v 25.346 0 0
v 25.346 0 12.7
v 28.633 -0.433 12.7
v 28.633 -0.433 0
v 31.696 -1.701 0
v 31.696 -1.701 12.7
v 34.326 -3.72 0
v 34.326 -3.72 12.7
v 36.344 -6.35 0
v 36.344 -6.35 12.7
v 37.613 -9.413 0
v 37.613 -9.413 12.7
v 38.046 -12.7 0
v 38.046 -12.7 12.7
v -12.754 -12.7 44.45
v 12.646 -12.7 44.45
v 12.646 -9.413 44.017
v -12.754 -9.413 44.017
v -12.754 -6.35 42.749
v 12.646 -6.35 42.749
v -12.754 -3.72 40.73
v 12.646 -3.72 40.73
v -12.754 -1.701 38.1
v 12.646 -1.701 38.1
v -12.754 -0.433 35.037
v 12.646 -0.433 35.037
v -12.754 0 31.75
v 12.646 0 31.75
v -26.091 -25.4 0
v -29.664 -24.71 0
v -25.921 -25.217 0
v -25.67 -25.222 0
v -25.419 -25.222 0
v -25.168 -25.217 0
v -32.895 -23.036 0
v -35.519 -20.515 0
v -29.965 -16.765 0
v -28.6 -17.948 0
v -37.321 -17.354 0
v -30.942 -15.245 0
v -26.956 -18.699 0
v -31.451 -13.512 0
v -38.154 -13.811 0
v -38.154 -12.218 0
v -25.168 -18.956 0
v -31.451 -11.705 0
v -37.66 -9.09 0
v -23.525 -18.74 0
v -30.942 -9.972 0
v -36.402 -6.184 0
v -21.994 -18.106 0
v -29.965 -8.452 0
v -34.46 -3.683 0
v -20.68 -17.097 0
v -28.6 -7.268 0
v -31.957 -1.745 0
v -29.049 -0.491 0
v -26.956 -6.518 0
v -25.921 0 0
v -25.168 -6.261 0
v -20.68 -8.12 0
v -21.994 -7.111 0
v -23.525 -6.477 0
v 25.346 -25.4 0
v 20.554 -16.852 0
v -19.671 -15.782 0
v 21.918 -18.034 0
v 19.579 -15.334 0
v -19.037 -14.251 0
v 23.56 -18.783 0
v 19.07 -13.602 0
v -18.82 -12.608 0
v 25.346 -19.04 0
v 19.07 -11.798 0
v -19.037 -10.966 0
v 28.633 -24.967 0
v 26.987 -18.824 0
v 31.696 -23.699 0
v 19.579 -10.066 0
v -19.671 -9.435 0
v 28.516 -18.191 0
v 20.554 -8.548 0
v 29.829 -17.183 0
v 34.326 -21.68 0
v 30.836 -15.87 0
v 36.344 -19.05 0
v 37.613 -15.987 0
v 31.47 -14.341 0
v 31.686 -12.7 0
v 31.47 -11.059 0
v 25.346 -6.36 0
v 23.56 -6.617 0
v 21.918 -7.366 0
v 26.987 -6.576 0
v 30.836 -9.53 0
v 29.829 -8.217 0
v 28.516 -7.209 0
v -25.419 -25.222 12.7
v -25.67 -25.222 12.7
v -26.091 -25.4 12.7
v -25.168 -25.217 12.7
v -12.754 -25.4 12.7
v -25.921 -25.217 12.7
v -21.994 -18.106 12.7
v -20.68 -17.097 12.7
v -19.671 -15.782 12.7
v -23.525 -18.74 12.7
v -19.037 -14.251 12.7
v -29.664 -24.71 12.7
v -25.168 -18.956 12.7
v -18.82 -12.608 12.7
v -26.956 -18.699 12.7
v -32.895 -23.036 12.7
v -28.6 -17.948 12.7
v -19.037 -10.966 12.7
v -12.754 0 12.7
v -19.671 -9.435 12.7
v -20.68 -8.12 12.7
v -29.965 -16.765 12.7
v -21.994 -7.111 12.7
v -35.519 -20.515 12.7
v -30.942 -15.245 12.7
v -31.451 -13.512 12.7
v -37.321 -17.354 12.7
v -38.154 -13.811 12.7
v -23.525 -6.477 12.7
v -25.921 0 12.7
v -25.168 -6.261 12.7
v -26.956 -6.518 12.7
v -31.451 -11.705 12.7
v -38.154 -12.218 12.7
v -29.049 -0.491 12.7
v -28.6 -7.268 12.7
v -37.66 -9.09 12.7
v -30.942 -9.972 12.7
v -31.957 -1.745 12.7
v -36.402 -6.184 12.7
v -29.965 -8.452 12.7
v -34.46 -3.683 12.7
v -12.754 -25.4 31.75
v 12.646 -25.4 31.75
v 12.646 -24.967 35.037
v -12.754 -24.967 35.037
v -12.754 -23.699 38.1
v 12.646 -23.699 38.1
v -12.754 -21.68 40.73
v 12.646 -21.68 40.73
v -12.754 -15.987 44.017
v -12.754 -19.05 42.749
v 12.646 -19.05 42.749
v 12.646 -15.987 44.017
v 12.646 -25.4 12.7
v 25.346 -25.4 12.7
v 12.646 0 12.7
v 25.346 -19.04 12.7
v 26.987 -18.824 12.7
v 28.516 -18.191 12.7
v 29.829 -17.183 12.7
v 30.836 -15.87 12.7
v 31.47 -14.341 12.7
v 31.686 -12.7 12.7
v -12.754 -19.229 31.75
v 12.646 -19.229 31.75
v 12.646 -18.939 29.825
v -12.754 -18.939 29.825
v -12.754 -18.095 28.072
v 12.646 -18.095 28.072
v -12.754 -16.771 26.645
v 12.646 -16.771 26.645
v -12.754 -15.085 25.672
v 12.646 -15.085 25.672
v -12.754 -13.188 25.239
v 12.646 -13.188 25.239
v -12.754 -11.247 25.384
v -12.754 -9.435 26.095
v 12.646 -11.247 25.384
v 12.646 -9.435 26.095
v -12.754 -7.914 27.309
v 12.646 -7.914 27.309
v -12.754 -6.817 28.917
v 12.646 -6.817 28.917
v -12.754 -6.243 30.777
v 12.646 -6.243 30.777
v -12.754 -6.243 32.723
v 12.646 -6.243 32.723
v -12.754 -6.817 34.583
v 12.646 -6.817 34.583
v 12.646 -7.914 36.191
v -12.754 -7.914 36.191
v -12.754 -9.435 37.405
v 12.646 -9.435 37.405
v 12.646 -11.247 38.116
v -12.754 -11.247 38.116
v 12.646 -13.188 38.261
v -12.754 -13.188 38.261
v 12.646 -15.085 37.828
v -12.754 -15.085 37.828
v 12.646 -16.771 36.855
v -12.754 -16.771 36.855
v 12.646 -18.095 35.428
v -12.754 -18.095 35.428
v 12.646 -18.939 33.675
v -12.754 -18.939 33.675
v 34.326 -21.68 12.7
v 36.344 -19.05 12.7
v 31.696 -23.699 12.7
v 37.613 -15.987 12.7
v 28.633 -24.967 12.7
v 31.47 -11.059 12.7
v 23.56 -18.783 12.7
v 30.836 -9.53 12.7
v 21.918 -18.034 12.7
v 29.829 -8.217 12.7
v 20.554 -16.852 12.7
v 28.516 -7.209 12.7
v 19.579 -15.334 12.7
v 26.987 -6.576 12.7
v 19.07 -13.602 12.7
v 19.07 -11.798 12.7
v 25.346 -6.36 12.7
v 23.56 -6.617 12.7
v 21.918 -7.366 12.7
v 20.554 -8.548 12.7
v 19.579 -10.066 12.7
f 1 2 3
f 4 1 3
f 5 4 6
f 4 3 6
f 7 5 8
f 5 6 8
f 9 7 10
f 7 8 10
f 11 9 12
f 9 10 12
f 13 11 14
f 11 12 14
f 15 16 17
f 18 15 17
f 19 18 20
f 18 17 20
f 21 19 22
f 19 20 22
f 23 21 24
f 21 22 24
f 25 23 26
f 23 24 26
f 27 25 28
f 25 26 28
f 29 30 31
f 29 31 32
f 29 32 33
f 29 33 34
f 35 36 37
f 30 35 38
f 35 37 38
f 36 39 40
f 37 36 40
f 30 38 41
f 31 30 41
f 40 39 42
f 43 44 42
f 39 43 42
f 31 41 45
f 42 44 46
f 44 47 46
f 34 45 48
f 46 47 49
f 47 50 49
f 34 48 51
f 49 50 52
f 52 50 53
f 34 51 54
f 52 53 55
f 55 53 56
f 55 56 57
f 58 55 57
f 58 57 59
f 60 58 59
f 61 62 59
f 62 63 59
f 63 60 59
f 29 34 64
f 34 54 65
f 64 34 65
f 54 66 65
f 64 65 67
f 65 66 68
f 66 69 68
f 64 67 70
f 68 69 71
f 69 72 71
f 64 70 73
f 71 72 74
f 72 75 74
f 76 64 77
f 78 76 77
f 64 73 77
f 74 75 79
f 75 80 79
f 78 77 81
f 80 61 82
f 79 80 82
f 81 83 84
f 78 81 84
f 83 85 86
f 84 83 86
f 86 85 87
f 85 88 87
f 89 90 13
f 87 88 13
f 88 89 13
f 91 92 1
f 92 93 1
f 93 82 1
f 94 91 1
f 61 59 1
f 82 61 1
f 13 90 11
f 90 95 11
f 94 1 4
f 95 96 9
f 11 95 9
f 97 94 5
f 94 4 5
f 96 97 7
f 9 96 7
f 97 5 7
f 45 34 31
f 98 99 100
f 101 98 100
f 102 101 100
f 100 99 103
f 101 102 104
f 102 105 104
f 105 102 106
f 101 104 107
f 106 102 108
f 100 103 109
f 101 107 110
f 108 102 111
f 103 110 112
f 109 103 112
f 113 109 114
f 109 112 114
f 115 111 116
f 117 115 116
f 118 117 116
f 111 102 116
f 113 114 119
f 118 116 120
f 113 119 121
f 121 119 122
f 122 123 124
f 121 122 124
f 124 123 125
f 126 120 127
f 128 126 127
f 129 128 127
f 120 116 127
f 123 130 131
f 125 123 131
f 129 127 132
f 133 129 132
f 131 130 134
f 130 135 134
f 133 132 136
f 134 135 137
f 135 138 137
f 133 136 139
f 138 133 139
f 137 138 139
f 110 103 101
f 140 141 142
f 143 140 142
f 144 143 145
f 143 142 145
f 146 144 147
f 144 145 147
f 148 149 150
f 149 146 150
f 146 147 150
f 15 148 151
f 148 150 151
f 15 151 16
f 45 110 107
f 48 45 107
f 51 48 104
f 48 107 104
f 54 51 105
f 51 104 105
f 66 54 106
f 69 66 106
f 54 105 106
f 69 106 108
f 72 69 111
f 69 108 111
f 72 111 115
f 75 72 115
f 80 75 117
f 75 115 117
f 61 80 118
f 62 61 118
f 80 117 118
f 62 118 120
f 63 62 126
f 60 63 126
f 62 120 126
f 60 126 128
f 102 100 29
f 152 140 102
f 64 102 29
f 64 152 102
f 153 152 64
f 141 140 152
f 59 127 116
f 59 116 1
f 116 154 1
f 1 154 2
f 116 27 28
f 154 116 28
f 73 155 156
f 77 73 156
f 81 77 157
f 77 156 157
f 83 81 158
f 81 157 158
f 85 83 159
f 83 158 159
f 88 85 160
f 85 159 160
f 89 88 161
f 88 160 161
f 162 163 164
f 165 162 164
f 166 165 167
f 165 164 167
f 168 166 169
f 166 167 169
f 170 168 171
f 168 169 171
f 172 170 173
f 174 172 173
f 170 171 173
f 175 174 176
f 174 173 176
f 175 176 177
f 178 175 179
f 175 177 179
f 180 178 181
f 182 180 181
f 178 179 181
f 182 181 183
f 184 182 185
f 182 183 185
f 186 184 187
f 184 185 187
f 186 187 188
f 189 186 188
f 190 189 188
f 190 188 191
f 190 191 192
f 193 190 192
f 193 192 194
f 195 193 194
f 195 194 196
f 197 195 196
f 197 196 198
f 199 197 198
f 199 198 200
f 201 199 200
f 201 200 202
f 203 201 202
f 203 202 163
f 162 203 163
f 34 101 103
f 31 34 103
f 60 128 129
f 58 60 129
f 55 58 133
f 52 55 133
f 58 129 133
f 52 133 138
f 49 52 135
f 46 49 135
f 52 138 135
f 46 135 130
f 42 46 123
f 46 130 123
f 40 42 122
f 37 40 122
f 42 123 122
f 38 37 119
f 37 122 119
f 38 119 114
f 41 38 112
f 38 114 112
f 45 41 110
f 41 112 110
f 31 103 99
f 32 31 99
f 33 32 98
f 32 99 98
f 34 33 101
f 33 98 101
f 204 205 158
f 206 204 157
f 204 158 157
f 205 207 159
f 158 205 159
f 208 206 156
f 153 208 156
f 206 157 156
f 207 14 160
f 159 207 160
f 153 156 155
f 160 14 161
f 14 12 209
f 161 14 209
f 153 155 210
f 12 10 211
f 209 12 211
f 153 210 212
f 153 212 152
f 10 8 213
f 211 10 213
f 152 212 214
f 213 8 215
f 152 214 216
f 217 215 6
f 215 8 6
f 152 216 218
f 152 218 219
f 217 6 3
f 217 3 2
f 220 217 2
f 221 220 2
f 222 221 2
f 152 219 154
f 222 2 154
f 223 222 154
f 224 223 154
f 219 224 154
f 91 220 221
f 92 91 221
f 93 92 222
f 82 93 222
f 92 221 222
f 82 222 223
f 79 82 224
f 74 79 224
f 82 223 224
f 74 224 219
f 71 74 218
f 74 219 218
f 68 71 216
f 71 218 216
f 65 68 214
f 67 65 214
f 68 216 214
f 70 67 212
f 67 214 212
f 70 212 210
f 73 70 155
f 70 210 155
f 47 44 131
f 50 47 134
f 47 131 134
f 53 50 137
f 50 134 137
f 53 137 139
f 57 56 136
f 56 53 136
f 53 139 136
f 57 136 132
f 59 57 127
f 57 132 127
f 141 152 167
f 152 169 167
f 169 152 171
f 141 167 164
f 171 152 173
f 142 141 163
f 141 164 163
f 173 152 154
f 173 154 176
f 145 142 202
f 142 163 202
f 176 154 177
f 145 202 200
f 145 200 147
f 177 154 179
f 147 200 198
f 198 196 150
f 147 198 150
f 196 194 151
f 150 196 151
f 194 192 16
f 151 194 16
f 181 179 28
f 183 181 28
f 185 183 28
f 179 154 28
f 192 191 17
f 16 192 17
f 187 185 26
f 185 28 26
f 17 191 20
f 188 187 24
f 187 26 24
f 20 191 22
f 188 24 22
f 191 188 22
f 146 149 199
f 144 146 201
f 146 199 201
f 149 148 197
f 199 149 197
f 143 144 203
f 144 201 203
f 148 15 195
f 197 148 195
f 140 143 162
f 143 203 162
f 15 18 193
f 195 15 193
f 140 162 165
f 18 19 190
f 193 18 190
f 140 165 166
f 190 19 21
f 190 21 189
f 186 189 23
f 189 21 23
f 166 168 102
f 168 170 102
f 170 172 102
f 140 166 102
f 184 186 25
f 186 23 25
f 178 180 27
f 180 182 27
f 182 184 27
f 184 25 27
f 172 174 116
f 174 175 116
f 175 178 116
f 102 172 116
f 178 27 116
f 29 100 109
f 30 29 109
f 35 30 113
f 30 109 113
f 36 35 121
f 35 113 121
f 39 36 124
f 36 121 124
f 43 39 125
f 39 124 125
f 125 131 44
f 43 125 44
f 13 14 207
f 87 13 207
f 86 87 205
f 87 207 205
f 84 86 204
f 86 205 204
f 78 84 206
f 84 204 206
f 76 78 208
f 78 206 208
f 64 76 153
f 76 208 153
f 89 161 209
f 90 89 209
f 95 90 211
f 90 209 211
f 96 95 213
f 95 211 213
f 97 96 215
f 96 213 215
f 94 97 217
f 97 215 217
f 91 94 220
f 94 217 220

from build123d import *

# Parameters (mm, degrees)
F1_DEPTH = 25.4
F3_DEPTH = 50.801
F5_DEPTH = 12.701
F7_DEPTH = 12.701
F9_DEPTH = 12.701


with BuildPart() as f1:
    # F0 (on Front) → F1 (new body)
    with BuildSketch(Plane.XZ):
        Polygon((-38.1542058029, 12.7), (-38.1542058029, 0), (38.0457941971, 0), (38.0457941971, 12.7), (12.6457941971, 12.7), (12.6457941971, 44.45), (-12.7542058029, 44.45), (-12.7542058029, 12.7), align=None)
    extrude(amount=F1_DEPTH)

    # F2 (on face) → F3 (cut, through all)
    with BuildSketch(Plane.YZ.offset(12.6457941971)):
        with BuildLine():
            Line((-19.2294398129, 31.75), (-6.1705601871, 31.75))
            ThreePointArc((-6.1705601871, 31.75), (-12.7, 38.2794398129), (-19.2294398129, 31.75))
        make_face()
        with BuildLine():
            ThreePointArc((-19.2294398129, 31.75), (-12.7, 25.2205601871), (-6.1705601871, 31.75))
            Line((-6.1705601871, 31.75), (-19.2294398129, 31.75))
        make_face()
        with BuildLine():
            ThreePointArc((-25.4, 31.75), (-21.6802561211, 40.7302561211), (-12.7, 44.45))
            Line((-12.7, 44.45), (-25.4, 44.45))
            Line((-25.4, 44.45), (-25.4, 31.75))
        make_face()
        with BuildLine():
            ThreePointArc((-12.7, 44.45), (-3.7197438789, 40.7302561211), (0, 31.75))
            Line((0, 31.75), (0, 44.45))
            Line((0, 44.45), (-12.7, 44.45))
        make_face()
    extrude(amount=-F3_DEPTH, mode=Mode.SUBTRACT)

    # F4 (on face) → F5 (cut, through all)
    with BuildSketch(Plane.XY.offset(12.7)):
        with BuildLine():
            Line((-25.1679819405, -25.2168271691), (-25.9211060628, -25.2168271691))
            ThreePointArc((-25.9211060628, -25.2168271691), (-25.5445440017, -25.2224491047), (-25.1679819405, -25.2168271691))
        make_face()
        with BuildLine():
            ThreePointArc((25.3457941971, -6.3600277162), (19.0058219133, -12.7), (25.3457941971, -19.0399722838))
            Line((25.3457941971, -19.0399722838), (25.3457941971, -6.3600277162))
        make_face()
        with BuildLine():
            Line((25.3457941971, -6.3600277162), (25.3457941971, -19.0399722838))
            ThreePointArc((25.3457941971, -19.0399722838), (29.8288315915, -17.1830373944), (31.6857664808, -12.7))
            ThreePointArc((31.6857664808, -12.7), (29.8288315915, -8.2169626056), (25.3457941971, -6.3600277162))
        make_face()
        with BuildLine():
            Line((-25.1679819405, -18.9560678934), (-25.1679819405, -6.2607592757))
            ThreePointArc((-25.1679819405, -6.2607592757), (-31.5156362493, -12.6084135845), (-25.1679819405, -18.9560678934))
        make_face()
        with BuildLine():
            ThreePointArc((-18.8203276317, -12.6084135845), (-20.6795125341, -8.1199441781), (-25.1679819405, -6.2607592757))
            Line((-25.1679819405, -6.2607592757), (-25.1679819405, -18.9560678934))
            ThreePointArc((-25.1679819405, -18.9560678934), (-20.6795125341, -17.0968829909), (-18.8203276317, -12.6084135845))
        make_face()
        with BuildLine():
            ThreePointArc((25.3457941971, 0), (34.3260503181, -3.7197438789), (38.0457941971, -12.7))
            Line((38.0457941971, -12.7), (38.0457941971, 0))
            Line((38.0457941971, 0), (25.3457941971, 0))
        make_face()
        with BuildLine():
            ThreePointArc((38.0457941971, -12.7), (34.3260503181, -21.6802561211), (25.3457941971, -25.4))
            Line((25.3457941971, -25.4), (38.0457941971, -25.4))
            Line((38.0457941971, -25.4), (38.0457941971, -12.7))
        make_face()
    extrude(amount=-F5_DEPTH, mode=Mode.SUBTRACT)

    # F6 (on face) → F7 (cut, through all)
    with BuildSketch(Plane.XY.offset(12.7)):
        with BuildLine():
            ThreePointArc((-38.1542058029, -12.2175221546), (-34.4600291378, -3.683299298), (-25.9211060628, 0))
            Line((-25.9211060628, 0), (-38.1542058029, 0))
            Line((-38.1542058029, 0), (-38.1542058029, -12.2175221546))
        make_face()
    extrude(amount=-F7_DEPTH, mode=Mode.SUBTRACT)

    # F8 (on face) → F9 (cut, through all)
    with BuildSketch(Plane.XY.offset(12.7)):
        with BuildLine():
            Line((-38.1542058029, -25.4), (-26.090927422, -25.4))
            ThreePointArc((-26.090927422, -25.4), (-34.2975944615, -21.8697418221), (-38.1542058029, -13.8112893863))
            Line((-38.1542058029, -13.8112893863), (-38.1542058029, -25.4))
        make_face()
    extrude(amount=-F9_DEPTH, mode=Mode.SUBTRACT)


solid = f1.part
